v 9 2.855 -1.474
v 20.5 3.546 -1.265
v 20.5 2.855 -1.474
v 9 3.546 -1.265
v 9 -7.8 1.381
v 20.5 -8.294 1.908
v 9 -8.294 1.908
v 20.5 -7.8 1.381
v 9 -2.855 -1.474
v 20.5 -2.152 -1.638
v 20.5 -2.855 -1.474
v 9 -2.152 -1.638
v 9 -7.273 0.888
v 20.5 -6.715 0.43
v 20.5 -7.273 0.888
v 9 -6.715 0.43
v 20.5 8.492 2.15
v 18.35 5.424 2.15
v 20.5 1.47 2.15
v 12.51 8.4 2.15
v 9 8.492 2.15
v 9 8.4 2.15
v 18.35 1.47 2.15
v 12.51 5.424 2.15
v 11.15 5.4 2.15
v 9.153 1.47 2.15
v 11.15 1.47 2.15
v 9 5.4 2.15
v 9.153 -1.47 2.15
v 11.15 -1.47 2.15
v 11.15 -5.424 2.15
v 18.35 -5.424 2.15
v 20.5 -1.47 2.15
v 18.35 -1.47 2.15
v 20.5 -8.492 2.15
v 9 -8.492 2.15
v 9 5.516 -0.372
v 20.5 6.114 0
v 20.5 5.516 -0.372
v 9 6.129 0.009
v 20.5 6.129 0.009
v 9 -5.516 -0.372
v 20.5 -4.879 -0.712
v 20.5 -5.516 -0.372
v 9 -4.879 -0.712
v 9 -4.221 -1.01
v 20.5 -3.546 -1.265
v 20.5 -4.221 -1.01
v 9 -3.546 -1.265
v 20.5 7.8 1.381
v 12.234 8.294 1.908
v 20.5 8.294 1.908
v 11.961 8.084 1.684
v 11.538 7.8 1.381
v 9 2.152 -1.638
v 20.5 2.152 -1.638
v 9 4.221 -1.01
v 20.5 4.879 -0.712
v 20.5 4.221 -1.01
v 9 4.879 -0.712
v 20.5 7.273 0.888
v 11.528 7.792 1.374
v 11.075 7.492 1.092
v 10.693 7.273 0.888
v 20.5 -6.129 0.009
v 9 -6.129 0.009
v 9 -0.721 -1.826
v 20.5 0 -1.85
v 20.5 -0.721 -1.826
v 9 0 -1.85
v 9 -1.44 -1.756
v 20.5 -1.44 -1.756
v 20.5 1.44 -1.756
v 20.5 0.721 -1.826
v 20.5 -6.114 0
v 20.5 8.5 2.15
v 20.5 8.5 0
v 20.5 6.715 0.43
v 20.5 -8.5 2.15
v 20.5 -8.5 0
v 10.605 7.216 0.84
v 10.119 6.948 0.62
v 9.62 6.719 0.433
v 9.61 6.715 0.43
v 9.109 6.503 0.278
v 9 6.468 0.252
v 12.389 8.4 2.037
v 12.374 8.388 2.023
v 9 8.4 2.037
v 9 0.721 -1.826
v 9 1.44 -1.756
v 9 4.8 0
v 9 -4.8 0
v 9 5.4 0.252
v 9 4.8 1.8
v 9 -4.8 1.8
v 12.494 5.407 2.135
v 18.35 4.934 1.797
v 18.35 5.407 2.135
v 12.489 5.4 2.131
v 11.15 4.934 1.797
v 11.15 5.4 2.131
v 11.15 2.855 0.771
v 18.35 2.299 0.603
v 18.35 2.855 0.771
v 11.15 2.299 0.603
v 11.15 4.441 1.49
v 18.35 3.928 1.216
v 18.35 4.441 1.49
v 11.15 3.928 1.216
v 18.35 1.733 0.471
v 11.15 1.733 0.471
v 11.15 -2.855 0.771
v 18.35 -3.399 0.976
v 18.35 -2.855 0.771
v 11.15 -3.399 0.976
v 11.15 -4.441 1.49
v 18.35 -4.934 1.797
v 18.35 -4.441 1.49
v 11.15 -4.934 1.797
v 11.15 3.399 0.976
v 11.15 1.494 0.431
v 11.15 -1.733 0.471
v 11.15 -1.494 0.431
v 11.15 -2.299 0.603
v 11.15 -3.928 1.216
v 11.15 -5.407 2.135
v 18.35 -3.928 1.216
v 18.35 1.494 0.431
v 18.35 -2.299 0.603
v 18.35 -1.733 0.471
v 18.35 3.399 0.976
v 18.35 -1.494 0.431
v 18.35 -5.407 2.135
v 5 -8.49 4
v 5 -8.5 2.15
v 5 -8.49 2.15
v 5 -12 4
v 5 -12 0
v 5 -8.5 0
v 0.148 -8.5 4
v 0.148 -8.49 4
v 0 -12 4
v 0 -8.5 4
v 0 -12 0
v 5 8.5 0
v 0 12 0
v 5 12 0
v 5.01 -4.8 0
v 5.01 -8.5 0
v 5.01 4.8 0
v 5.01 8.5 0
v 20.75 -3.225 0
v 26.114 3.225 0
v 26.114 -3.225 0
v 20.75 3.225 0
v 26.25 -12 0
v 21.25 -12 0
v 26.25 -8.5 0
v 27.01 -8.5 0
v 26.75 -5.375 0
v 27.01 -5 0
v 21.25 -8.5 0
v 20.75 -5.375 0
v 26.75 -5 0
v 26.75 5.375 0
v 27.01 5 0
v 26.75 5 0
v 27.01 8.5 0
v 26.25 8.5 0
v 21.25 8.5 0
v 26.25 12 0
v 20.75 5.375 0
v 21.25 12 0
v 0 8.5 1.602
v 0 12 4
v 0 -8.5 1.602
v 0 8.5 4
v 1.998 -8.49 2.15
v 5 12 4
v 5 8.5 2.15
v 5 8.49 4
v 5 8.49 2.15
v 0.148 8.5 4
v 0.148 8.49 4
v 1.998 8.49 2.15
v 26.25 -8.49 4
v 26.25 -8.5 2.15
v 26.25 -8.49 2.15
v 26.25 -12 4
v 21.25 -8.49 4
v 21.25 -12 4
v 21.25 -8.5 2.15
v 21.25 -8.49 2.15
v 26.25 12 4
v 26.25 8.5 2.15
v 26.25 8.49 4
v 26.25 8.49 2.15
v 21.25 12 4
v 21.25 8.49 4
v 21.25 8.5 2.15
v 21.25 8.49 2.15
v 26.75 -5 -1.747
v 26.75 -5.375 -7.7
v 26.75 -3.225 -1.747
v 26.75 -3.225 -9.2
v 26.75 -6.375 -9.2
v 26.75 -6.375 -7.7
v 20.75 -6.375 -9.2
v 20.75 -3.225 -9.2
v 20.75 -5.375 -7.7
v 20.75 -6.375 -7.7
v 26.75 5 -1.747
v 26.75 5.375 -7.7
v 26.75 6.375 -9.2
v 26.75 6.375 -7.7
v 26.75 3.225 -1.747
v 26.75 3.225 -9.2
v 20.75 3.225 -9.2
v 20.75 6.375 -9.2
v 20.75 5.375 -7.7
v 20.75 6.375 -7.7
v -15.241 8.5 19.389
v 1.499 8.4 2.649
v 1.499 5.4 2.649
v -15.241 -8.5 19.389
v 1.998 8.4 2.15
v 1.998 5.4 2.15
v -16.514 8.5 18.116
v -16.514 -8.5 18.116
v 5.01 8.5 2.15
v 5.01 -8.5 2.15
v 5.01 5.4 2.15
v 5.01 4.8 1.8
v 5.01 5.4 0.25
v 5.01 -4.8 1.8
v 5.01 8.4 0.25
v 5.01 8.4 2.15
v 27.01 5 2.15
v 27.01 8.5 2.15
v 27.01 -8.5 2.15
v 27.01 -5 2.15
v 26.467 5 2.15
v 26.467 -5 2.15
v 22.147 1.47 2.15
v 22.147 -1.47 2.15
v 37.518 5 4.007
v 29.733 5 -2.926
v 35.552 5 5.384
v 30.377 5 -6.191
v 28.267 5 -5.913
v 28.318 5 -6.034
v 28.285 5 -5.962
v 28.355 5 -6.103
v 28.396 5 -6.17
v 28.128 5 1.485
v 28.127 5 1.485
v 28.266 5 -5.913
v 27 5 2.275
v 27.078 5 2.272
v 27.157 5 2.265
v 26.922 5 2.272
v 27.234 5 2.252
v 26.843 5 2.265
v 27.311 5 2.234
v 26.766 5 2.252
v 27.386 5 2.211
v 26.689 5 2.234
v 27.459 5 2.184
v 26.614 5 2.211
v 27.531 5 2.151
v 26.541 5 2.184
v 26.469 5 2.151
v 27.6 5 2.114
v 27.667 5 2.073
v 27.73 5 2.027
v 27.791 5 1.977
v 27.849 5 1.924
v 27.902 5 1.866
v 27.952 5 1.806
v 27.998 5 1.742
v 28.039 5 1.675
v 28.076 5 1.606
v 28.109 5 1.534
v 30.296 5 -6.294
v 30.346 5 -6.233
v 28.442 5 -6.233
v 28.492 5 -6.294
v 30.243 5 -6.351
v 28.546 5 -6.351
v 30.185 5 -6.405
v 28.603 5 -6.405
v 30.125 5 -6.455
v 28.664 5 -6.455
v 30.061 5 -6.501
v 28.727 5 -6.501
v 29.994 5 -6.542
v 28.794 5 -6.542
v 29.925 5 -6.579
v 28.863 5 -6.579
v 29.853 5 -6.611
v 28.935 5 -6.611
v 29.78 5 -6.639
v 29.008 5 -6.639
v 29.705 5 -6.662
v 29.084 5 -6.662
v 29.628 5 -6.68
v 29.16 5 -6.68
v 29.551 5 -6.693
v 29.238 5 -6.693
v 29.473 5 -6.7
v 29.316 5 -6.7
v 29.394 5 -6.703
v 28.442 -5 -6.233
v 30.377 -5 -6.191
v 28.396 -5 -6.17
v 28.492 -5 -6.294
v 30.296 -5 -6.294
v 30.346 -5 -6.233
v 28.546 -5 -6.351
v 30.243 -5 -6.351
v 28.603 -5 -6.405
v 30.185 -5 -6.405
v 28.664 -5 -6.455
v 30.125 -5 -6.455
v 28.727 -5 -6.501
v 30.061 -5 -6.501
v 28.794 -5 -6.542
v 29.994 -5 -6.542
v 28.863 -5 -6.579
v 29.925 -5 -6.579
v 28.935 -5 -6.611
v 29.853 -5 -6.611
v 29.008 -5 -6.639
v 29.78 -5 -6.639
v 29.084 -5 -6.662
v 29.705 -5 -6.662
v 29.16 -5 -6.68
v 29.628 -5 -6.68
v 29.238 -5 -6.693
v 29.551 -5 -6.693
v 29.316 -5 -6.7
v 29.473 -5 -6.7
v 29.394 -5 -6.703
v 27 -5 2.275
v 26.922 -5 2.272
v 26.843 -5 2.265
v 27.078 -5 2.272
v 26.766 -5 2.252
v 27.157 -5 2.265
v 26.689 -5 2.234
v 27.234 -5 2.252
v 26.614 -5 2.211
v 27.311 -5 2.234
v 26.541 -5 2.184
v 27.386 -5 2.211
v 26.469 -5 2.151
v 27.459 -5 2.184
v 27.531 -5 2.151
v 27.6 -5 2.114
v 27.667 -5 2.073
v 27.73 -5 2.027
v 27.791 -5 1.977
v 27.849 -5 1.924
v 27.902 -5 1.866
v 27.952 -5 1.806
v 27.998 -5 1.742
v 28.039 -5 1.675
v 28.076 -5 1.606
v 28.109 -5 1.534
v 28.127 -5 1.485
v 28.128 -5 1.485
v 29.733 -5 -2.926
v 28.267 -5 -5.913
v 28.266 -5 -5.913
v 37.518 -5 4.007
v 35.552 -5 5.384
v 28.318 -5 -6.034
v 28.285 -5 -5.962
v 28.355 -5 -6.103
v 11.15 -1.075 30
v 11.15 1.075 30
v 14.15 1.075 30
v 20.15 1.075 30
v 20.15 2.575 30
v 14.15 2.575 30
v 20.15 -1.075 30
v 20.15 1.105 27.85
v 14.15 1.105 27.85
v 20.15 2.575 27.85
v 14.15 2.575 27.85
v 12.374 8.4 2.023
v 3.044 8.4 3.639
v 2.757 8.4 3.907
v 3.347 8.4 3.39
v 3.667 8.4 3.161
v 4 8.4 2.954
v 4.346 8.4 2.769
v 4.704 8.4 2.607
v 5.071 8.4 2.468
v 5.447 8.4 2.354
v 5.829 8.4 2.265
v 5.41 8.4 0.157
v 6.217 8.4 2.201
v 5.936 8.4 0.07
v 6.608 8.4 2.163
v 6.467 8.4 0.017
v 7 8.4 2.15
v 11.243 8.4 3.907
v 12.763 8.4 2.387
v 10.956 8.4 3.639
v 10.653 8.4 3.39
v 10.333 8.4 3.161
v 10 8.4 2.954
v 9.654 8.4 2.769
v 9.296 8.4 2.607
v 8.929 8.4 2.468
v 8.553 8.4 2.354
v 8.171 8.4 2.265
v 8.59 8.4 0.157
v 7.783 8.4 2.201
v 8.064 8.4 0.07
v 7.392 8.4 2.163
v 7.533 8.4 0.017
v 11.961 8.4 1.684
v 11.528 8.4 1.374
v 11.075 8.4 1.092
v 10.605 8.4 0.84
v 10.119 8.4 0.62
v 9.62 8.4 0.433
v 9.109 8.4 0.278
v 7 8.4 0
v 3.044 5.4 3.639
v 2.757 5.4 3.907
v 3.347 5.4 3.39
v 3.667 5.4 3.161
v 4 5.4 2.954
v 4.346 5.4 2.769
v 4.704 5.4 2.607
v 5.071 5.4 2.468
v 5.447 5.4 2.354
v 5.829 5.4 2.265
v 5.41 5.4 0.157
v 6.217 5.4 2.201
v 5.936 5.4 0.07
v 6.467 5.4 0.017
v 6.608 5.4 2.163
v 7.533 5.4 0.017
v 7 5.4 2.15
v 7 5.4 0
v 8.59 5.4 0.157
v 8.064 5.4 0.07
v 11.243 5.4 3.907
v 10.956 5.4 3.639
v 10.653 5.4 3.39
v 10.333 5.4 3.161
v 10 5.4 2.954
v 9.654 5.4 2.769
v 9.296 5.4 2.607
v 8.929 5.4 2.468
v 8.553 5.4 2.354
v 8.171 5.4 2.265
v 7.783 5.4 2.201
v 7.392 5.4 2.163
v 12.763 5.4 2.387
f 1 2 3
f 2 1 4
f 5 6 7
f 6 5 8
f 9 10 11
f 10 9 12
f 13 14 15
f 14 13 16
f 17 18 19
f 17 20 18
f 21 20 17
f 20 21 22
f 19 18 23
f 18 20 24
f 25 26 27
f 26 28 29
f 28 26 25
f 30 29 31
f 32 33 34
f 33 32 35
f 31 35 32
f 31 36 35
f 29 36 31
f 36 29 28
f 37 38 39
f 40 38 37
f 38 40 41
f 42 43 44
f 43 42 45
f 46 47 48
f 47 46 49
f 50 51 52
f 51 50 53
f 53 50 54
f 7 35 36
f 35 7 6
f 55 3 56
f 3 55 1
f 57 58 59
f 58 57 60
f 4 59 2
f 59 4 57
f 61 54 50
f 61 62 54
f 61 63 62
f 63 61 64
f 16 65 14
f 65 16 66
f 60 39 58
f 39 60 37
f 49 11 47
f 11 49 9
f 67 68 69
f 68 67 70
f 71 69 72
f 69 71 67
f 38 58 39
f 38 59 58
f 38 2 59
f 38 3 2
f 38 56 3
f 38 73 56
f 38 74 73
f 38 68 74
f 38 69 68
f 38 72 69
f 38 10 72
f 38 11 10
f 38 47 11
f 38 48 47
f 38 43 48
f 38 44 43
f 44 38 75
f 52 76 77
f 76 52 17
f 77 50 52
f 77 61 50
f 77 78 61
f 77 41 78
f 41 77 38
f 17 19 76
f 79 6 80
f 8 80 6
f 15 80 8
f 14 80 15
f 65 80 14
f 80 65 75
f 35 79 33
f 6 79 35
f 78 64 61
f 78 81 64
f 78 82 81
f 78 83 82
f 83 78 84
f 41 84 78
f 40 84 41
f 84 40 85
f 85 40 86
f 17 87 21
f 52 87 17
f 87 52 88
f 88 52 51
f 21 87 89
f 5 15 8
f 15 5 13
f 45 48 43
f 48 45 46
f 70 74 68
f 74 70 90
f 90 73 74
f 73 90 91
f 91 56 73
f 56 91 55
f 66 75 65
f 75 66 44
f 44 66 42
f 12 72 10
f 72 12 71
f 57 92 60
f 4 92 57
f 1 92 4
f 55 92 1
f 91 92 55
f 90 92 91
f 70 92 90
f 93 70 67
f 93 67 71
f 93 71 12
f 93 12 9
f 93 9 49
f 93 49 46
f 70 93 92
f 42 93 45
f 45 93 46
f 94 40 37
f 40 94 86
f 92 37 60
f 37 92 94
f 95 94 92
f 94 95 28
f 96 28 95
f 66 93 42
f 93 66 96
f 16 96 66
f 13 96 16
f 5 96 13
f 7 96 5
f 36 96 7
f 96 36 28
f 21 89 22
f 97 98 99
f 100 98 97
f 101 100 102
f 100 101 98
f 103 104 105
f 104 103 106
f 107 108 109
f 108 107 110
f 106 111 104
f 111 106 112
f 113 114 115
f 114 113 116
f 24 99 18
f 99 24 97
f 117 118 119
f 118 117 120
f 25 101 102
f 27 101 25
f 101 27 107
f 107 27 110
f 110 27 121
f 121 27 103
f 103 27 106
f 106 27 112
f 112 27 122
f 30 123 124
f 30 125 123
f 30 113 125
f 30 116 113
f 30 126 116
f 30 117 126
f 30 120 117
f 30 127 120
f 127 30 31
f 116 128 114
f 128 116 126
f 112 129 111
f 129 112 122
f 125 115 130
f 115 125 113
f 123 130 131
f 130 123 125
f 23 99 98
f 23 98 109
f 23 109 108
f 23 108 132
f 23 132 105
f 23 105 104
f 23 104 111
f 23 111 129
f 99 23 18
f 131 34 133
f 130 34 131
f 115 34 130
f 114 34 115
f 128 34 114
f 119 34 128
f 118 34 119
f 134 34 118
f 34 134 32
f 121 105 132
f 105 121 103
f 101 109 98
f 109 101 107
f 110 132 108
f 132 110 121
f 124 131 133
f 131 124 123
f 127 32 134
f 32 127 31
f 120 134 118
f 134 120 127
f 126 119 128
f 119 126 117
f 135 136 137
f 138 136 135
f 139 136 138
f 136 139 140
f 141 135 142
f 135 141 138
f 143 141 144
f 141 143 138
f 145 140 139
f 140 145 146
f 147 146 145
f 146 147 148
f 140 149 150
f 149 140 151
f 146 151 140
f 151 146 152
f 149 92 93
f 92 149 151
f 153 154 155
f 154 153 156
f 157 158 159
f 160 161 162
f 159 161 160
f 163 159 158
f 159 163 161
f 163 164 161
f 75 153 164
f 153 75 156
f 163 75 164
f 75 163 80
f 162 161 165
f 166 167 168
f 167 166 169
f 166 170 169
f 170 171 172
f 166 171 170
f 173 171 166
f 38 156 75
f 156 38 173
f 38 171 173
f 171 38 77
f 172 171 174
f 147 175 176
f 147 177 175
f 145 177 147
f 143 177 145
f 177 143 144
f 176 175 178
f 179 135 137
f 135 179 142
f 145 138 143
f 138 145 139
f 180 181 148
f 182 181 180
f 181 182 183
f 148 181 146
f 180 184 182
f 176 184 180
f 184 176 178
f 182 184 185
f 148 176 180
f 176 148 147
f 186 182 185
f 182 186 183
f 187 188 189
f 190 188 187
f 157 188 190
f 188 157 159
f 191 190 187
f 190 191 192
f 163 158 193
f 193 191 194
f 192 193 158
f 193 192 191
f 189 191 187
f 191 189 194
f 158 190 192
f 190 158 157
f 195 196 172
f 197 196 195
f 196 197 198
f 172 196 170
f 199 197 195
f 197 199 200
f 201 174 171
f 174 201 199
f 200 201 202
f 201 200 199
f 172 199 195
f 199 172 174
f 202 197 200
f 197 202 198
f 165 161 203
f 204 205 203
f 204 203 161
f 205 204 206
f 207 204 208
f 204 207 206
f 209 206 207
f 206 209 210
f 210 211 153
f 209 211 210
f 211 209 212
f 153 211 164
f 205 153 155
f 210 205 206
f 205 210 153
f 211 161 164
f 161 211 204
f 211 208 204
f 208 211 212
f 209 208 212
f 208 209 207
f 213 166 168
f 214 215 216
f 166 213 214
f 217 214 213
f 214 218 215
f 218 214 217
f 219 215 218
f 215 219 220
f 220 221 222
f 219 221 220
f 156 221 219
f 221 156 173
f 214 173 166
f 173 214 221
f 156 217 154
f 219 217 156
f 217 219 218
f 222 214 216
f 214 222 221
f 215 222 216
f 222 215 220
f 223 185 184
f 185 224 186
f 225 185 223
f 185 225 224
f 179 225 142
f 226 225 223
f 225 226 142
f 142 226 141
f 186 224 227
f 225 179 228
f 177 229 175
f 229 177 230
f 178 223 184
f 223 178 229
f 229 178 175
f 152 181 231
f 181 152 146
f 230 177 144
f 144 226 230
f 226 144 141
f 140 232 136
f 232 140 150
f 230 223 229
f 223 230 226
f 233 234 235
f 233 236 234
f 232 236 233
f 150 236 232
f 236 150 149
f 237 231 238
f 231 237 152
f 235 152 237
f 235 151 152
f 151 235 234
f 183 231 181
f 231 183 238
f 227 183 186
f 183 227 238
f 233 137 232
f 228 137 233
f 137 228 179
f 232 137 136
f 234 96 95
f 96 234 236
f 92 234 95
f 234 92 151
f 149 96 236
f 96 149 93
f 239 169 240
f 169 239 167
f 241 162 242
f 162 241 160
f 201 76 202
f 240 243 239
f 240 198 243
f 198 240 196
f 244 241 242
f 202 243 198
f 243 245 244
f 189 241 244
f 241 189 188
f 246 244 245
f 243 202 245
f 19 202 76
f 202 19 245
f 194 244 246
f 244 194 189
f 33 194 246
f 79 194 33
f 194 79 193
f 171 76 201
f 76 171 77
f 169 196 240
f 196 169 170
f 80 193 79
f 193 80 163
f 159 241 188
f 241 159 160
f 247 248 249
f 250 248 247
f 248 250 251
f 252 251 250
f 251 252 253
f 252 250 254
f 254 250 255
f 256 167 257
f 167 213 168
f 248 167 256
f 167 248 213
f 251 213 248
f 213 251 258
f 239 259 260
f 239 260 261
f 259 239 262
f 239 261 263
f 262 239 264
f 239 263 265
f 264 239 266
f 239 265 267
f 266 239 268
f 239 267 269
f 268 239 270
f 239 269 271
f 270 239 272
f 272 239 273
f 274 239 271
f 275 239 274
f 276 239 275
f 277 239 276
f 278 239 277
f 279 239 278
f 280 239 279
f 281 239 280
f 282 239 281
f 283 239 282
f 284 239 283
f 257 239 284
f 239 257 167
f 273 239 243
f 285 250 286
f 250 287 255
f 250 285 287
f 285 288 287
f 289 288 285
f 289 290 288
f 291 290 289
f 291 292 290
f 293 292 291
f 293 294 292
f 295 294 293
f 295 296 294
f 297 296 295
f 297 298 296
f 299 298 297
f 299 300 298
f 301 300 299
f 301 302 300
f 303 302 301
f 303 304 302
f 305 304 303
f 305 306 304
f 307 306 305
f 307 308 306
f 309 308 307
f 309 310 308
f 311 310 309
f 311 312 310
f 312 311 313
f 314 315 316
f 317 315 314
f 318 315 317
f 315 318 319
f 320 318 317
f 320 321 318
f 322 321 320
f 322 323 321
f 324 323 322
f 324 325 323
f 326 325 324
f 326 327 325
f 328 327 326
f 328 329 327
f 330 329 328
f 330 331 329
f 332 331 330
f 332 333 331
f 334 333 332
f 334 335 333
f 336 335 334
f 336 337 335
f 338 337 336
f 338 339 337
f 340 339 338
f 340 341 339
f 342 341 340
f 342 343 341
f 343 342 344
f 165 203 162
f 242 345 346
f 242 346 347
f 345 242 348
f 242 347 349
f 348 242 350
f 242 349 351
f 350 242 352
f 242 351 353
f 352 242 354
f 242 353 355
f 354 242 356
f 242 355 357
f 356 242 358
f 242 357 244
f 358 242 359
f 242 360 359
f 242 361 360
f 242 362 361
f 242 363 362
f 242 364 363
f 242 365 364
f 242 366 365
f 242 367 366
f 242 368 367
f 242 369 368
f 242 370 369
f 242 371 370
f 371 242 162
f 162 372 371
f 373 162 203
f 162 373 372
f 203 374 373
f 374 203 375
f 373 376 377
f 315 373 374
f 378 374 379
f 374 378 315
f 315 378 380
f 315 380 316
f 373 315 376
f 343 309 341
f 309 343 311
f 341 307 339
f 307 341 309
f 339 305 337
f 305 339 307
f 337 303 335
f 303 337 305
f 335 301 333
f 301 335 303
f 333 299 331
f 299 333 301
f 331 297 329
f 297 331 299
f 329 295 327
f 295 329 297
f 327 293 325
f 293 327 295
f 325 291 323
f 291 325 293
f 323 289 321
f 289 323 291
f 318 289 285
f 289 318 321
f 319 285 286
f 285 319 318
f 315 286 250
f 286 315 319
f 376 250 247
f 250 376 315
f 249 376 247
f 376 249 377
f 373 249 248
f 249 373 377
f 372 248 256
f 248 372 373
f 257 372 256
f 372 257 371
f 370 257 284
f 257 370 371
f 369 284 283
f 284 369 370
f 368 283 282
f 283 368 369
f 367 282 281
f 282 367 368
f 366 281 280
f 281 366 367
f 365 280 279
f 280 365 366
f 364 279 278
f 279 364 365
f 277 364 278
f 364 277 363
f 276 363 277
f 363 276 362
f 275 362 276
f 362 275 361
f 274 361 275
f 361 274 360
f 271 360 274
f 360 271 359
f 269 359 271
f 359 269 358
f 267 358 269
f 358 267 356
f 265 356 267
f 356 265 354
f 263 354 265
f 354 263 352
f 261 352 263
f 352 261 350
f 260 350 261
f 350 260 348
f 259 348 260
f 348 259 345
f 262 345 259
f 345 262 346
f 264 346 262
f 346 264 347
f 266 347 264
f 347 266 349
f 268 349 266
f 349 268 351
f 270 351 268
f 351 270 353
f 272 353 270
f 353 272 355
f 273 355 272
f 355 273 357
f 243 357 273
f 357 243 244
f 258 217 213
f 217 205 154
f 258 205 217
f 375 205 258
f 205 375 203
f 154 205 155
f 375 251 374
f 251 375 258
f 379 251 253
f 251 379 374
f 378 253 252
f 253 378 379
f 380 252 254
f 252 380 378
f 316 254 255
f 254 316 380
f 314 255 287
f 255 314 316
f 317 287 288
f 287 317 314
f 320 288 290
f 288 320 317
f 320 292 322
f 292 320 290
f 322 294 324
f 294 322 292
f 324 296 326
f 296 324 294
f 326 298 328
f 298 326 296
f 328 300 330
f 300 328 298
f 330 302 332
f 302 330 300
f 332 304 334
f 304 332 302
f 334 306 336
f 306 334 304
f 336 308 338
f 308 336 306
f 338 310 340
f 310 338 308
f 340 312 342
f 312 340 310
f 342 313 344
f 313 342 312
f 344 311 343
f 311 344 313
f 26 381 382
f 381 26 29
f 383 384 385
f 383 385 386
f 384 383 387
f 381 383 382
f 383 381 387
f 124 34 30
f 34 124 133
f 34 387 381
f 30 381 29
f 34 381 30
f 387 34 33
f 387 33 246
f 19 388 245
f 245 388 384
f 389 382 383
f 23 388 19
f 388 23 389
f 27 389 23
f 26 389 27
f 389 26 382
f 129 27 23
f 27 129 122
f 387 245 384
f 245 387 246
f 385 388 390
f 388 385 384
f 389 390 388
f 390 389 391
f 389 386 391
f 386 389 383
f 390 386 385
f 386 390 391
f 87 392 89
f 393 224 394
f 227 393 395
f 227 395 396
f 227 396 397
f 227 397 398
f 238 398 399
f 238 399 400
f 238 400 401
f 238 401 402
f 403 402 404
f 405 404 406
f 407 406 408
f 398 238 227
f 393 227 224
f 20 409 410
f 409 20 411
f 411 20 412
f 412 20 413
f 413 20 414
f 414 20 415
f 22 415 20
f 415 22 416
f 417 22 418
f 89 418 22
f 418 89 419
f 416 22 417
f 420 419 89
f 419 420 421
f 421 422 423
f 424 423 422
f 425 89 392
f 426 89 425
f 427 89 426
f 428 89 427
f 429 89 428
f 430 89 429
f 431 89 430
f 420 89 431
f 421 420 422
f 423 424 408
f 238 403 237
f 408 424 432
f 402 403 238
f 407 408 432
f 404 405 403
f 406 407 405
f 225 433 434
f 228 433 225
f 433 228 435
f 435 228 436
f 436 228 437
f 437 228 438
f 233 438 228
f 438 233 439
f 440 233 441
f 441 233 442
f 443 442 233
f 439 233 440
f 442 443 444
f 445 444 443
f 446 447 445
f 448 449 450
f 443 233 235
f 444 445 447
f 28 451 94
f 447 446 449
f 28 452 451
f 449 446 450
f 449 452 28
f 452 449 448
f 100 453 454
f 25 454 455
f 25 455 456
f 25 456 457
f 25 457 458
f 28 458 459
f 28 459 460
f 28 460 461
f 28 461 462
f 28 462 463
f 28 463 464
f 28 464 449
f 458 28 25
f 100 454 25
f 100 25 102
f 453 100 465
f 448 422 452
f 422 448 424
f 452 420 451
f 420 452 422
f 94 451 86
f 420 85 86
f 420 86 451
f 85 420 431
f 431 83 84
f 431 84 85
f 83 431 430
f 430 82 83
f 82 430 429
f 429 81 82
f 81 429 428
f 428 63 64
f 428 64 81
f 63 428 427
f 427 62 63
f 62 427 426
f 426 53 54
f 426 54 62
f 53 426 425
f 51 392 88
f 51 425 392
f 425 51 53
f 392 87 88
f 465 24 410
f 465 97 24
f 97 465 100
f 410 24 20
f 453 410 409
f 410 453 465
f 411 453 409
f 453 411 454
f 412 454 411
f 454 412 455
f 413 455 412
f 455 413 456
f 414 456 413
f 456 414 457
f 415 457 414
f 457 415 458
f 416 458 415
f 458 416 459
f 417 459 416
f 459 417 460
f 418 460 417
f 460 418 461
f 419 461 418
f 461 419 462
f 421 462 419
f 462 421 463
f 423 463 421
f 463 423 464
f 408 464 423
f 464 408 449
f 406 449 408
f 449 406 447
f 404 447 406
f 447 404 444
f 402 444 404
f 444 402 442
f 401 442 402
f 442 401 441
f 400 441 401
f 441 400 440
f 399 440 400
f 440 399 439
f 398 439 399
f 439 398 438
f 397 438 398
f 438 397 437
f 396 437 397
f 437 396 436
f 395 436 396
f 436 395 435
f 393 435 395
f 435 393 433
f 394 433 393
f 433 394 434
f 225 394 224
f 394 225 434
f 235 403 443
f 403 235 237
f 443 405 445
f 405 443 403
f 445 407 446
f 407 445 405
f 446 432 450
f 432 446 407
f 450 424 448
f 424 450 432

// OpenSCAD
/**
 * Front panel hinge clip of a Mitsubishi MSZ-GS09NA mini split (molded 312L_P-1 and 312R_P-1).
 * The legs and lugs snap into the unit, and the cradle and barrel carry the panel pivot. Print
 * one of each hand; the right clip mirrors the left across the long centerline. All dimensions
 * are in millimeters.
 *
 * Measure against the real part from one datum: X along the long axis from the outer end face of
 * the upper shoulder, where the angled plate leaves it; Y from the long centerline; Z from the
 * bottom face of the base plate (the legs and barrel reach below it). Set Highlight to tint one feature in the preview, then adjust that
 * feature's group.
 */

/* [Part] */
// Part to generate
Part = "left"; // [left: Left (312L), right: Right (312R), pair: Pair]

/* [Base Plate] */
// Thickness of the shoulders
Plate_Thickness = 2.15;

/* [Plate A] */
// Length of the angled plate along its slope
Plate_A_Length = 25;

// Width of the angled plate
Plate_A_Width = 17;

// Thickness of the angled plate
Plate_A_Thickness = 1.8;

// Angle of the plate above the base plate
Plate_A_Angle = 45; // [0:5:90]

/* [Shoulder] */
// Length of the upper shoulder along the long axis
Shoulder_Length = 5;

// Width of the upper shoulder without the lugs
Shoulder_Width = 17;

/* [Neck] */
// Length of the neck, where the original breaks
Neck_Length = 4;

// Width of the neck
Neck_Width = 9.6;

// Thickness of the neck
Neck_Thickness = 1.8;

/* [Barrel] */
// Length of the barrel trough along the long axis
Barrel_Length = 11.5;

// Width of the barrel across the rim
Barrel_Width = 17;

// Depth of the barrel below the top of the base plate
Barrel_Depth = 4;

// Wall thickness of the barrel and its end walls
Barrel_Wall = 2.15;

/* [Lower Shoulder] */
// Length of the lower shoulder along the long axis
Lower_Length = 6.5;

// Width of the lower shoulder without the lugs
Lower_Width = 17;

/* [Tongue] */
// Developed length of the tongue from the lower shoulder to its tip
Tongue_Length = 19.45;

// Width of the tongue
Tongue_Width = 10;

// Thickness of the tongue
Tongue_Thickness = 2.4;

// Length of the first leg of the tongue, which drops below the base plate
Tongue_Drop_Length = 7;

// Angle of the first tongue leg below horizontal
Tongue_Drop_Angle = 70; // [0:5:90]

// Angle of the second tongue leg above horizontal
Tongue_Rise_Angle = 55; // [0:5:90]

/* [Lugs] */
// Length of a lug along the long axis
Lug_Length = 5;

// Height of a lug above the bottom face of the base plate
Lug_Height = 4;

// Distance a lug projects beyond the shoulder
Lug_Projection = 3.5;

/* [Fin] */
// Distance from the upper shoulder end face to the front base edge of the fin
Fin_Position = 9;

// Height of the fin above the bottom face of the base plate
Fin_Height = 30;

// Width of the fin at its base along the long axis
Fin_Base_Width = 13.3;

// Width of the fin at its top along the long axis
Fin_Top_Width = 9;

// Thickness of the fin at its base
Fin_Base_Thickness = 3;

// Thickness of the fin at its top
Fin_Top_Thickness = 2.15;

/* [Lip] */
// Length of the lip along the long axis, at the back edge of the fin top
Lip_Length = 6;

// Height of the lip down from the top of the fin
Lip_Height = 2.15;

// Distance the lip overhangs the fin on the cradle side
Lip_Overhang = 1.5;

/* [Cradle] */
// Inside radius of the cradle
Cradle_Radius = 6;

// Wall thickness of the cradle
Cradle_Wall = 2.15;

// Width of the cradle across the part
Cradle_Width = 3;

// Distance from the upper shoulder end face to the cradle center
Cradle_Position = 7;

// Distance from the long centerline to the cradle center, on the lip side
Cradle_Offset = 6.9;

// Angle the cradle arc spans
Cradle_Arc_Angle = 90; // [30:5:180]

/* [Legs] */
// Gap between the inside faces of the two legs
Leg_Gap = 6.45;

// Width of a leg along the long axis
Leg_Width = 6;

// Length of a leg below the bottom face of the base plate
Leg_Length = 9.2;

// Wall thickness of a leg
Leg_Thickness = 2.15;

// Distance from the upper shoulder end face to the leg center
Leg_Position = 23.75;

// Height of a foot at the leg tip
Foot_Height = 1.5;

// Distance a foot projects past the leg face (0 to disable)
Foot_Projection = 1;

// Face of the leg that carries the foot
Foot_Side = "outward"; // [outward: Outward, inward: Inward]

/* [Preview] */
// Feature to tint in the preview
Highlight = "none"; // [none: None, plate_a: Plate A, shoulder: Shoulder, neck: Neck, barrel: Barrel, lower: Lower Shoulder, tongue: Tongue, lugs: Lugs, fin: Fin, lip: Lip, cradle: Cradle, legs: Legs]

/* [Hidden] */
$fn = 96;

Join_Overlap = 0.01;
Pair_Gap = 5;
Highlight_Color = "tomato";

Neck_Start = Shoulder_Length;
Barrel_Start = Neck_Start + Neck_Length;
Lower_Start = Barrel_Start + Barrel_Length;
Base_End = Lower_Start + Lower_Length;

Barrel_Radius = (pow(Barrel_Width / 2, 2) + pow(Barrel_Depth, 2)) / (2 * Barrel_Depth);
Barrel_Center_Z = Plate_Thickness - Barrel_Depth + Barrel_Radius;
Cradle_Outer_Radius = Cradle_Radius + Cradle_Wall;
Cradle_Center_Z = Plate_Thickness + Cradle_Radius;
Fin_Top_End = Fin_Position + (Fin_Base_Width + Fin_Top_Width) / 2;
Tongue_Rise_Length = Tongue_Length - Tongue_Drop_Length;
Pair_Offset = (max(Shoulder_Width, Lower_Width) + 2 * Lug_Projection + Pair_Gap) / 2;

assert(Neck_Thickness <= Plate_Thickness, "Neck_Thickness must not exceed Plate_Thickness");
assert(Neck_Width < min(Shoulder_Width, Barrel_Width), "Neck_Width must be less than Shoulder_Width and Barrel_Width");
assert(Barrel_Depth <= Barrel_Width / 2, "Barrel_Depth must be at most half of Barrel_Width");
assert(Barrel_Wall < Barrel_Depth, "Barrel_Wall must be less than Barrel_Depth");
assert(Barrel_Length > 2 * Barrel_Wall, "Barrel_Length must exceed twice Barrel_Wall");
assert(Tongue_Drop_Length < Tongue_Length, "Tongue_Drop_Length must be less than Tongue_Length");
assert(Tongue_Width <= Lower_Width, "Tongue_Width must not exceed Lower_Width");
assert(Fin_Top_Width <= Fin_Base_Width, "Fin_Top_Width must not exceed Fin_Base_Width");
assert(Fin_Top_Thickness <= Fin_Base_Thickness, "Fin_Top_Thickness must not exceed Fin_Base_Thickness");
assert(Lip_Length <= Fin_Top_Width, "Lip_Length must not exceed Fin_Top_Width");
assert(Lip_Height < Fin_Height, "Lip_Height must be less than Fin_Height");
assert(Fin_Position >= 0 && Fin_Position + Fin_Base_Width <= Base_End, "The fin must stand on the base plate");
assert(Cradle_Offset + Cradle_Width / 2 <= Shoulder_Width / 2, "The cradle must stay within Shoulder_Width");
assert(Lug_Length <= min(Shoulder_Length, Lower_Length), "Lug_Length must not exceed Shoulder_Length or Lower_Length");
assert(Cradle_Position >= 0 && Cradle_Position <= Base_End, "The cradle must stand on the base plate");
assert(Leg_Gap + 2 * Leg_Thickness <= Lower_Width, "The legs must fit within Lower_Width");
assert(Leg_Position - Leg_Width / 2 >= 0 && Leg_Position + Leg_Width / 2 <= Base_End, "The legs must sit under the base plate");
assert(Foot_Height <= Leg_Length, "Foot_Height must not exceed Leg_Length");
assert(Foot_Side == "outward" || 2 * Foot_Projection < Leg_Gap, "Inward feet must leave a gap between the legs");

module Feature(name) {
  if ($preview && Highlight == name) color(Highlight_Color) children();
  else children();
}

module Sweep(start, length) {
  translate([start, 0, 0]) rotate([90, 0, 90]) linear_extrude(length) children();
}

function ArcSteps(from, to) = ceil($fn * abs(to - from) / 360);

function ArcPoints(radius, from, to) = [
  for (i = [0:ArcSteps(from, to)])
    let (angle = from + (to - from) * i / ArcSteps(from, to)) radius * [cos(angle), sin(angle)]
];

module PlateA() {
  translate([Plate_A_Thickness, 0, Plate_Thickness / 2]) mirror([1, 0, 0]) rotate([0, -Plate_A_Angle, 0])
    translate([0, -Plate_A_Width / 2, -Plate_A_Thickness / 2]) cube([Plate_A_Length, Plate_A_Width, Plate_A_Thickness]);
}

module Shoulder() {
  translate([0, -Shoulder_Width / 2, 0]) cube([Shoulder_Length + Join_Overlap, Shoulder_Width, Plate_Thickness]);
}

module Neck() {
  translate([Neck_Start, -Neck_Width / 2, 0]) cube([Neck_Length + 2 * Join_Overlap, Neck_Width, Neck_Thickness]);
}

module BarrelSegment(radius) {
  intersection() {
    translate([0, Barrel_Center_Z]) circle(radius);
    translate([-Barrel_Width / 2, Plate_Thickness - Barrel_Depth - 1]) square([Barrel_Width, Barrel_Depth + 1]);
  }
}

module Barrel() {
  difference() {
    Sweep(Barrel_Start, Barrel_Length) BarrelSegment(Barrel_Radius);
    Sweep(Barrel_Start + Barrel_Wall, Barrel_Length - 2 * Barrel_Wall) intersection() {
      translate([0, Barrel_Center_Z]) circle(Barrel_Radius - Barrel_Wall);
      translate([-Barrel_Width / 2, -Barrel_Depth]) square([Barrel_Width, Plate_Thickness + Barrel_Depth + 1]);
    }
  }
}

module Lower() {
  translate([Lower_Start, -Lower_Width / 2, 0]) cube([Lower_Length + Join_Overlap, Lower_Width, Plate_Thickness]);
}

module TongueStrip(from, angle, length) {
  translate(from) rotate(angle) translate([0, -Tongue_Thickness / 2]) square([length, Tongue_Thickness]);
}

module Tongue() {
  start = [Base_End, Plate_Thickness / 2];
  bend = start + Tongue_Drop_Length * [cos(-Tongue_Drop_Angle), sin(-Tongue_Drop_Angle)];
  rotate([90, 0, 0]) linear_extrude(Tongue_Width, center = true) {
    TongueStrip(start, -Tongue_Drop_Angle, Tongue_Drop_Length);
    TongueStrip(bend, Tongue_Rise_Angle, Tongue_Rise_Length);
    translate(start) circle(d = Tongue_Thickness);
    translate(bend) circle(d = Tongue_Thickness);
  }
}

module Lugs() {
  for (x = [Shoulder_Length / 2, Lower_Start + Lower_Length / 2], side = [-1, 1]) {
    width = x < Neck_Start ? Shoulder_Width : Lower_Width;
    translate([x, side * (width / 2 + (Lug_Projection - Join_Overlap) / 2), Lug_Height / 2])
      cube([Lug_Length, Lug_Projection + Join_Overlap, Lug_Height], center = true);
  }
}

module Fin() {
  hull() {
    translate([Fin_Position, -Fin_Base_Thickness / 2, 0]) cube([Fin_Base_Width, Fin_Base_Thickness, Join_Overlap]);
    translate([Fin_Position + (Fin_Base_Width - Fin_Top_Width) / 2, -Fin_Top_Thickness / 2, Fin_Height - Join_Overlap])
      cube([Fin_Top_Width, Fin_Top_Thickness, Join_Overlap]);
  }
}

module Lip() {
  translate([Fin_Top_End - Lip_Length, -Fin_Top_Thickness / 2, Fin_Height - Lip_Height])
    cube([Lip_Length, Fin_Top_Thickness + Lip_Overhang, Lip_Height]);
}

module Cradle() {
  half_arc = Cradle_Arc_Angle / 2;
  translate([Cradle_Position, Cradle_Offset + Cradle_Width / 2, Cradle_Center_Z]) rotate([90, 0, 0])
    linear_extrude(Cradle_Width) polygon(concat(
      ArcPoints(Cradle_Outer_Radius, 270 - half_arc, 270 + half_arc),
      ArcPoints(Cradle_Radius, 270 + half_arc, 270 - half_arc)
    ));
}

module Foot(side) {
  face = Foot_Side == "outward" ? Leg_Gap / 2 + Leg_Thickness : Leg_Gap / 2;
  reach = Foot_Side == "outward" ? 1 : -1;
  translate([Leg_Position, side * (face + reach * (Foot_Projection - Join_Overlap) / 2), -Leg_Length + Foot_Height / 2])
    cube([Leg_Width, Foot_Projection + Join_Overlap, Foot_Height], center = true);
}

module Legs() {
  for (side = [-1, 1]) {
    translate([Leg_Position - Leg_Width / 2, side * (Leg_Gap / 2 + Leg_Thickness / 2) - Leg_Thickness / 2, -Leg_Length])
      cube([Leg_Width, Leg_Thickness, Leg_Length + Plate_Thickness / 2]);
    if (Foot_Projection > 0) Foot(side);
  }
}

module Clip() {
  Feature("plate_a") PlateA();
  Feature("shoulder") Shoulder();
  Feature("neck") Neck();
  Feature("barrel") Barrel();
  Feature("lower") Lower();
  Feature("tongue") Tongue();
  Feature("lugs") Lugs();
  Feature("fin") Fin();
  Feature("lip") Lip();
  Feature("cradle") Cradle();
  Feature("legs") Legs();
}

if (Part == "left") Clip();
else if (Part == "right") mirror([0, 1, 0]) Clip();
else {
  translate([0, -Pair_Offset, 0]) Clip();
  translate([0, Pair_Offset, 0]) mirror([0, 1, 0]) Clip();
}
